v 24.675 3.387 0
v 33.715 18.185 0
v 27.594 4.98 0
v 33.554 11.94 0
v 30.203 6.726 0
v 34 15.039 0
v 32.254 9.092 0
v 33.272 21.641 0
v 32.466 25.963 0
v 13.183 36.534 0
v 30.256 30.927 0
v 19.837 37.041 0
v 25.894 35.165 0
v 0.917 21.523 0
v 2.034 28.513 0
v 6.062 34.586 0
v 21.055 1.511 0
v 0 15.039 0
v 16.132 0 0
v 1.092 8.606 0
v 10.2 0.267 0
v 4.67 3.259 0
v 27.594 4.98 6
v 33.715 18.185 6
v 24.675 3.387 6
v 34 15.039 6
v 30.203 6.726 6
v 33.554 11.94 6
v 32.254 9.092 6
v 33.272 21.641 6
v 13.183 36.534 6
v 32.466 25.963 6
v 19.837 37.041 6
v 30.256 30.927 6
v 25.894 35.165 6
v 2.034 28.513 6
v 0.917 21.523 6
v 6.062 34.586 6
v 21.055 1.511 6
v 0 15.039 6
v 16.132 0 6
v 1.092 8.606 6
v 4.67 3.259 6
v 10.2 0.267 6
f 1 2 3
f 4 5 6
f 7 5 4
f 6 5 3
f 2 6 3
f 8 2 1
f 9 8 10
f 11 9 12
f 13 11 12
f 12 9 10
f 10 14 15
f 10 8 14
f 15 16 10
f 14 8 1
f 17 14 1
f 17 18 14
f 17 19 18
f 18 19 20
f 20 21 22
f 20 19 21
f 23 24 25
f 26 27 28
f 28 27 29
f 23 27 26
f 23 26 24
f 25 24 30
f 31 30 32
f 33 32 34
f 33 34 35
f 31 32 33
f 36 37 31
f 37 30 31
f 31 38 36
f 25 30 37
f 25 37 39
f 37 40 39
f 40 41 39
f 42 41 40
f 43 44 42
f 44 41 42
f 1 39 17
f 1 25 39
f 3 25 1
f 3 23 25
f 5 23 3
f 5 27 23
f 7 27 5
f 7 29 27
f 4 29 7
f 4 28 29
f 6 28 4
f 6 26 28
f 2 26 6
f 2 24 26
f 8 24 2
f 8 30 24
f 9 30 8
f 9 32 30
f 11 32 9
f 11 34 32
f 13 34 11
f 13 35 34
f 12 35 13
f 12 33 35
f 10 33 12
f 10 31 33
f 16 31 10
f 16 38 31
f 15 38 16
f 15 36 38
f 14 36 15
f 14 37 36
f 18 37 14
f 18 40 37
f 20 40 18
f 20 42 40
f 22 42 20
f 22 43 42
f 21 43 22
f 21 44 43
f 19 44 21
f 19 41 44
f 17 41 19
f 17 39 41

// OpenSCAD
$fn = 32;

// ----------------------------------------------------------------------
// Cam disc: base radius 11.0 mm, lift 12.0 mm, 22 profile points
// ----------------------------------------------------------------------

// --- parameters (mm) ---
profile_height = 6;       // extrusion height
profile_points = 22;      // points of the closed outline

profile = [[34, 15.039], [33.715, 18.185], [33.272, 21.641], [32.466, 25.963], [30.256, 30.927], [25.894, 35.165], [19.837, 37.041], [13.183, 36.534], [6.062, 34.586], [2.034, 28.513], [0.917, 21.523], [0, 15.039], [1.092, 8.606], [4.67, 3.259], [10.2, 0.267], [16.132, 0], [21.055, 1.511], [24.675, 3.387], [27.594, 4.98], [30.203, 6.726], [32.254, 9.092], [33.554, 11.94]];  // single closed polygon, 22 points, counter clockwise

// --- the one profile operation ---
linear_extrude(height = profile_height) polygon(points = profile);
